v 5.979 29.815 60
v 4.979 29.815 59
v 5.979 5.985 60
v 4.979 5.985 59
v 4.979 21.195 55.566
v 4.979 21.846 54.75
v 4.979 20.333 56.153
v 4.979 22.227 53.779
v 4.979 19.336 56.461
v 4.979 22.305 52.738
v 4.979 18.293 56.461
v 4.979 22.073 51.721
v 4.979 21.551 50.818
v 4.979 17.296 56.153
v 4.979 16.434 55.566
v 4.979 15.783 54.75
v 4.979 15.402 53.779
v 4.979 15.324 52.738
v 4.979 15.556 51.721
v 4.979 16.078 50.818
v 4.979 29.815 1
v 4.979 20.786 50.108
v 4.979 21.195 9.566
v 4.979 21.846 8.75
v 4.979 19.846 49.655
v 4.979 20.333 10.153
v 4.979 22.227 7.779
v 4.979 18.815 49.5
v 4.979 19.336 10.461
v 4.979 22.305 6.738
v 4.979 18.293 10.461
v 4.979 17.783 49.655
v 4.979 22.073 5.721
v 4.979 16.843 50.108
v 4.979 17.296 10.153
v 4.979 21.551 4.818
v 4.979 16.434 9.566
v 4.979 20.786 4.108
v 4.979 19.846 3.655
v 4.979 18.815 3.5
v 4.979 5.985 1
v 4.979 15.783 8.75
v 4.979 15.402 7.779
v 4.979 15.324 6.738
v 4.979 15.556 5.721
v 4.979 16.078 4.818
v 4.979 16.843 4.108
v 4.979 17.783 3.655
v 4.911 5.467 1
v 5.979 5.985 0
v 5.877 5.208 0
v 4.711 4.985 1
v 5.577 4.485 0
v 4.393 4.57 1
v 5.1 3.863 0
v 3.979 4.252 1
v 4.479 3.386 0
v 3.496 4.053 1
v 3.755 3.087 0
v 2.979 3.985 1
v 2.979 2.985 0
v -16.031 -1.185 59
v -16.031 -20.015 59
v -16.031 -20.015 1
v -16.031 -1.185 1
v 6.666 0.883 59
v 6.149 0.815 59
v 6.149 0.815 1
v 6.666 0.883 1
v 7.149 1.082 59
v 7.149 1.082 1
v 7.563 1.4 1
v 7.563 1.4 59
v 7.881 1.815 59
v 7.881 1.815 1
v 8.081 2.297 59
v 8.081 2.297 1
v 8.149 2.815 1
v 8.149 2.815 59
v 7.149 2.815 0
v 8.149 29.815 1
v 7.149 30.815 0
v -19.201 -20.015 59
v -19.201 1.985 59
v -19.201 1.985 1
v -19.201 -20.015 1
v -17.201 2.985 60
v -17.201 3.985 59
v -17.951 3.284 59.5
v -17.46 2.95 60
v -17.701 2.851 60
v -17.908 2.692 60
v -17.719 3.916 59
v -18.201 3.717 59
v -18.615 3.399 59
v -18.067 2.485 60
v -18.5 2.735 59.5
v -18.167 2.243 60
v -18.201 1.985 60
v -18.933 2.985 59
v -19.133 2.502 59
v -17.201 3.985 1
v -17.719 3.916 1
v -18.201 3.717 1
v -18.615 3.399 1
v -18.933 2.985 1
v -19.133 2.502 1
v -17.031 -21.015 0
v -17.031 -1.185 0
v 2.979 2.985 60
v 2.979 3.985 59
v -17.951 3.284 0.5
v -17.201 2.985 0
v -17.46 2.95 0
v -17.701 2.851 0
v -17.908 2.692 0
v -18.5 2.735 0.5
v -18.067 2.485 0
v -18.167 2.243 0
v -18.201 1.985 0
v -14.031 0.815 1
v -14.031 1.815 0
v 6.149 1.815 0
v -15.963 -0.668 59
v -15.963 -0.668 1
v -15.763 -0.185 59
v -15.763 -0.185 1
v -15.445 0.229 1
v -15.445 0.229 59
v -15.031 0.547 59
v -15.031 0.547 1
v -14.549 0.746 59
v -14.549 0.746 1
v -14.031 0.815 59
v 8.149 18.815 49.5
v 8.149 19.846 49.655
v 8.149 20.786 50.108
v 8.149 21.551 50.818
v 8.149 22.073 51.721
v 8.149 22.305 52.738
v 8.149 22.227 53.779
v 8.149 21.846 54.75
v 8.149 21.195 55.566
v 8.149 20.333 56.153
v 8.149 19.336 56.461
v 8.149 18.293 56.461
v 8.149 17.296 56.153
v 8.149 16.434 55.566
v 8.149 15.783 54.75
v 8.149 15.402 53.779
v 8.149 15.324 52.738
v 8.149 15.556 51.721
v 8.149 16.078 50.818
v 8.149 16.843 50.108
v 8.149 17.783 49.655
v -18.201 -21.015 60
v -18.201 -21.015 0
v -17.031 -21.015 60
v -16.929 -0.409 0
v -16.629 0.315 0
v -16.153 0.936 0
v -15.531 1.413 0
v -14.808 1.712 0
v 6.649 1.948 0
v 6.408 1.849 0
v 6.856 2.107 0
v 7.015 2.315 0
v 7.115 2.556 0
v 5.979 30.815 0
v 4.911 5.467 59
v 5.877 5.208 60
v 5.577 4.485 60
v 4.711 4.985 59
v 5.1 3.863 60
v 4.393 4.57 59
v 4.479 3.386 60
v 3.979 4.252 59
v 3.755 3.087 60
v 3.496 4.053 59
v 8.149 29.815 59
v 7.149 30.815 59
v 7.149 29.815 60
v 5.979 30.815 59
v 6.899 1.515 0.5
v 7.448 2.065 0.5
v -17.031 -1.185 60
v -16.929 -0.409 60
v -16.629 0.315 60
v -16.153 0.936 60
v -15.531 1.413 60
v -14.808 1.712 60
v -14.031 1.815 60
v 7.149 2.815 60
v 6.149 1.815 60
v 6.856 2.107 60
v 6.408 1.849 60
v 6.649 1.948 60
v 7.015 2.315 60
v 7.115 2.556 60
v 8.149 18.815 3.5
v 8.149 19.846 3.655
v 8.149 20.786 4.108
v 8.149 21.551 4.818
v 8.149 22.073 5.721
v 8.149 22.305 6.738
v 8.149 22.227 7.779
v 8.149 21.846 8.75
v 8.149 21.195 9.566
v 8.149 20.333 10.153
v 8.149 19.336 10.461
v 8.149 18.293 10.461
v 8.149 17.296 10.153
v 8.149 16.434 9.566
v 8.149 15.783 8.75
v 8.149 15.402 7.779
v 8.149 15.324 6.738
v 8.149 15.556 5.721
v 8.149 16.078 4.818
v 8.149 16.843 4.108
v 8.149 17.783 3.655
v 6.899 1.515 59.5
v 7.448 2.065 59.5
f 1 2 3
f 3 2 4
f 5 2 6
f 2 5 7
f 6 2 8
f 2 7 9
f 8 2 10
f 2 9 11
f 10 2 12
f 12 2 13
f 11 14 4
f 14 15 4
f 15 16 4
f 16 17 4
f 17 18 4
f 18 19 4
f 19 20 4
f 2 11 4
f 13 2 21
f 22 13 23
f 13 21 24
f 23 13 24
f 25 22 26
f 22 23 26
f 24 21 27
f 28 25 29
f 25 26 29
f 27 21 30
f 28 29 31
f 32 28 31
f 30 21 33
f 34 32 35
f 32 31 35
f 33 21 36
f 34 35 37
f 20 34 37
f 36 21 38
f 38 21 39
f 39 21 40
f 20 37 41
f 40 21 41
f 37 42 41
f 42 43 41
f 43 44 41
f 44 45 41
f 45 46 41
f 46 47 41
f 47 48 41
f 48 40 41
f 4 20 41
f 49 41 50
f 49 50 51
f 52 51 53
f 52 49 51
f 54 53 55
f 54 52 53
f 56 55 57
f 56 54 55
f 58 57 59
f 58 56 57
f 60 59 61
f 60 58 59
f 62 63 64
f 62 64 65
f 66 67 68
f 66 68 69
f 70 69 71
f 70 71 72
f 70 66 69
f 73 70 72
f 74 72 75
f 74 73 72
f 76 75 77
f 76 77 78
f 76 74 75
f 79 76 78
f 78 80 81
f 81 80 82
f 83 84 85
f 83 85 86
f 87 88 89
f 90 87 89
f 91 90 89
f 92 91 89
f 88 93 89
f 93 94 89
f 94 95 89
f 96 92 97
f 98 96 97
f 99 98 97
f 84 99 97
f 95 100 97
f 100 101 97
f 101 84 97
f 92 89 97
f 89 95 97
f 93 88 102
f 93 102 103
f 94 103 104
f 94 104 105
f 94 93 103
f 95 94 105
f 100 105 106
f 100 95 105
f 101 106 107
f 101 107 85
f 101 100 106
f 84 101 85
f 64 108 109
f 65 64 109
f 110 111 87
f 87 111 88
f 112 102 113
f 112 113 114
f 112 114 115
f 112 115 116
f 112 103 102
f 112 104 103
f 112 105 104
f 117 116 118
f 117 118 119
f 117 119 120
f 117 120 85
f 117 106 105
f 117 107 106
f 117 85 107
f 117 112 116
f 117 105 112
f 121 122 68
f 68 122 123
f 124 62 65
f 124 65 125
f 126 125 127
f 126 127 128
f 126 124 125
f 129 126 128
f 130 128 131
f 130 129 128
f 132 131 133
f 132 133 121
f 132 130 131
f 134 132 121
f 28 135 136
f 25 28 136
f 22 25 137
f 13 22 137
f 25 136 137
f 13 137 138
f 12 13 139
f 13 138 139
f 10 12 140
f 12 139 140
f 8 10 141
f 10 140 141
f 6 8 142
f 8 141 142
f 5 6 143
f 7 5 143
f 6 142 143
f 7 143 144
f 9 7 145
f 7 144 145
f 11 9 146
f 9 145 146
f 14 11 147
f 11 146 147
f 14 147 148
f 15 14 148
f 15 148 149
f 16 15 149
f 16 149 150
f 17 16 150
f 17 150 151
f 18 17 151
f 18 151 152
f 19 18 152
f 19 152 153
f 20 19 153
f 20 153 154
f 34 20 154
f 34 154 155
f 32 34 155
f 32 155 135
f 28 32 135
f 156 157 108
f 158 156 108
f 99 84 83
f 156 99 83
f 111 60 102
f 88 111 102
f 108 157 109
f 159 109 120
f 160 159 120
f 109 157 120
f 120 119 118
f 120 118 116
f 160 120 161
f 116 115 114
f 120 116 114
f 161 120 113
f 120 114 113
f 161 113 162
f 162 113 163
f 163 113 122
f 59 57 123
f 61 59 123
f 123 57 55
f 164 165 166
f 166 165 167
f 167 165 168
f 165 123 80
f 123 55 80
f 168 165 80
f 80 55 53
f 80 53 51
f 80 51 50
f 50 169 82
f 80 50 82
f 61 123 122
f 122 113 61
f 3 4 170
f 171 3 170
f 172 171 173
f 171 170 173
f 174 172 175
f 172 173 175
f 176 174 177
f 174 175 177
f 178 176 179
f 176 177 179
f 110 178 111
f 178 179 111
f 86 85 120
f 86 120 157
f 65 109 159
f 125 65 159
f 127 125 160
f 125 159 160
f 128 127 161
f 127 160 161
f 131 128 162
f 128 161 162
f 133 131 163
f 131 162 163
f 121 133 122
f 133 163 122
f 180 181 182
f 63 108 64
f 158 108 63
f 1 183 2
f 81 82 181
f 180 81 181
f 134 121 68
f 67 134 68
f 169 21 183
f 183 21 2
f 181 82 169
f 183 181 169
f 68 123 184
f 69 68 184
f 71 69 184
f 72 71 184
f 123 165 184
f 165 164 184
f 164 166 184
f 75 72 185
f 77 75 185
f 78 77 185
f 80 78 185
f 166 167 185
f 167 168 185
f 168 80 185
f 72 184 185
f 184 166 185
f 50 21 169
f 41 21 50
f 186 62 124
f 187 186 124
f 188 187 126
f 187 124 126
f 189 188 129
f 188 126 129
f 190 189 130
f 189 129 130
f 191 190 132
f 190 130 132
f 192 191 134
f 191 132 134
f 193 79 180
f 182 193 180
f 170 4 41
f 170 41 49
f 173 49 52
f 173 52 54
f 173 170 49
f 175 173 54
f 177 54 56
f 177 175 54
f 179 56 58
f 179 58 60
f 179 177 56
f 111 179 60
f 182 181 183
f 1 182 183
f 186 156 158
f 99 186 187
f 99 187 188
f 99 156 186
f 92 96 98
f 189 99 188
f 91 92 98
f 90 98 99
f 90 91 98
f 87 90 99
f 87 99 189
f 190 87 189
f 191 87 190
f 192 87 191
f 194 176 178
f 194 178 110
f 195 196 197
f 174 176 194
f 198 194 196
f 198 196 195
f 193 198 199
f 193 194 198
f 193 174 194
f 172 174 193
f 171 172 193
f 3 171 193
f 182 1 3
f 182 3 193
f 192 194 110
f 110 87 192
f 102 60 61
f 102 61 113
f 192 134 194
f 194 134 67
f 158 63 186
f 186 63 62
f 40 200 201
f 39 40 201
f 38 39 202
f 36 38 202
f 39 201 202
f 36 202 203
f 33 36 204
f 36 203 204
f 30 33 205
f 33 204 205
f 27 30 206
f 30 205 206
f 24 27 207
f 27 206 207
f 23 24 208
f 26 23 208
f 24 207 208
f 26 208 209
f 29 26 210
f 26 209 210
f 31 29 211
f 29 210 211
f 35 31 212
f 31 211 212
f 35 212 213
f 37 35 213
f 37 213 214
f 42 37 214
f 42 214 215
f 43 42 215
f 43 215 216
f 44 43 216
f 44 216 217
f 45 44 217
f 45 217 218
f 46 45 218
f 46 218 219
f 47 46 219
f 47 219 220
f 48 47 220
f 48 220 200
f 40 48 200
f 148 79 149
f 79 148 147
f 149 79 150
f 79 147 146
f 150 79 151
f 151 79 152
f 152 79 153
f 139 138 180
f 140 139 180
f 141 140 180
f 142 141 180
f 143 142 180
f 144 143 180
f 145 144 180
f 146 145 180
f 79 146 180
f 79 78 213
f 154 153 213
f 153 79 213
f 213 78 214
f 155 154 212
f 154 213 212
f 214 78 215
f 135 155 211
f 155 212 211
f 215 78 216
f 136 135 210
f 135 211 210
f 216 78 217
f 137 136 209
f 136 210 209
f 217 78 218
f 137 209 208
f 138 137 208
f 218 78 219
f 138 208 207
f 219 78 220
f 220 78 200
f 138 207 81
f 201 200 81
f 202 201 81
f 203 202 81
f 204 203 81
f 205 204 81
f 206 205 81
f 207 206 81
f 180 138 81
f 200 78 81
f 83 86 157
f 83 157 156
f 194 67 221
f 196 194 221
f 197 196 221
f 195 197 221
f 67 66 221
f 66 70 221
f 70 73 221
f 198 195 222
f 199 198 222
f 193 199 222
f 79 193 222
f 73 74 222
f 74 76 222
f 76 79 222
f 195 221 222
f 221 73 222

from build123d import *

# Parameters (mm, degrees)
SALIENTE_EXTRUIR1_DEPTH = 60
REDONDEO1_R             = 2
CROQUIS2_R              = 3.5
CORTAR_EXTRUIR1_DEPTH   = 60
CHAFL_N1_SIZE           = 1


with BuildPart() as part:
    # Croquis1 → Saliente-Extruir1 (new body)
    with BuildSketch(Plane.XY):
        Polygon((-16.031190476, -21.01547619), (-16.031190476, 0.81452381), (8.148809524, 0.81452381), (8.148809524, 30.81452381), (4.978809524, 30.81452381), (4.978809524, 3.98452381), (-19.201190476, 3.98452381), (-19.201190476, -21.01547619), align=None)
    extrude(amount=SALIENTE_EXTRUIR1_DEPTH)

    # Redondeo1
    redondeo1_edges = [part.edges().sort_by_distance(p)[0] for p in [
        (-19.201190476, 3.98452381, 30),
        (4.978809524, 3.98452381, 30),
        (8.148809524, 0.81452381, 30),
        (-16.031190476, 0.81452381, 30),
    ]]
    fillet(redondeo1_edges, radius=REDONDEO1_R)

    # Croquis2 → Cortar-Extruir1 (cut)
    with BuildSketch(Plane(origin=(8.148809524, 0, 0), x_dir=(0, 0, -1), z_dir=(1, 0, 0))):
        with Locations((-53, 18.81452381)):
            Circle(CROQUIS2_R)
        with Locations((-7, 18.81452381)):
            Circle(CROQUIS2_R)
    extrude(amount=-CORTAR_EXTRUIR1_DEPTH, mode=Mode.SUBTRACT)

    # Chaflán1
    chafl_n1_edges = [part.edges().sort_by_distance(p)[0] for p in [
        (-16.031190476, -11.10047619, 0),
        (-19.201190476, -21.01547619, 30),
        (4.978809524, 30.81452381, 30),
        (8.148809524, 30.81452381, 30),
        (-16.031190476, -21.01547619, 30),
        (6.563809524, 30.81452381, 60),
        (4.978809524, 18.39952381, 60),
        (-19.201190476, -9.51547619, 0),
        (-19.201190476, -9.51547619, 60),
        (-7.111190476, 3.98452381, 0),
        (8.148809524, 16.81452381, 0),
        (-3.941190476, 0.81452381, 0),
        (7.563023086, 1.400310247, 0),
        (-18.615404039, 3.398737372, 0),
        (-7.111190476, 3.98452381, 60),
        (-3.941190476, 0.81452381, 60),
        (8.148809524, 16.81452381, 60),
        (7.563023086, 1.400310247, 60),
        (-18.615404039, 3.398737372, 60),
        (4.393023086, 4.570310247, 0),
        (4.393023086, 4.570310247, 60),
        (-15.445404039, 0.228737372, 0),
        (-15.445404039, 0.228737372, 60),
        (-16.031190476, -11.10047619, 60),
        (4.978809524, 18.39952381, 0),
    ]]
    chamfer(chafl_n1_edges, length=CHAFL_N1_SIZE)


solid = part.part
